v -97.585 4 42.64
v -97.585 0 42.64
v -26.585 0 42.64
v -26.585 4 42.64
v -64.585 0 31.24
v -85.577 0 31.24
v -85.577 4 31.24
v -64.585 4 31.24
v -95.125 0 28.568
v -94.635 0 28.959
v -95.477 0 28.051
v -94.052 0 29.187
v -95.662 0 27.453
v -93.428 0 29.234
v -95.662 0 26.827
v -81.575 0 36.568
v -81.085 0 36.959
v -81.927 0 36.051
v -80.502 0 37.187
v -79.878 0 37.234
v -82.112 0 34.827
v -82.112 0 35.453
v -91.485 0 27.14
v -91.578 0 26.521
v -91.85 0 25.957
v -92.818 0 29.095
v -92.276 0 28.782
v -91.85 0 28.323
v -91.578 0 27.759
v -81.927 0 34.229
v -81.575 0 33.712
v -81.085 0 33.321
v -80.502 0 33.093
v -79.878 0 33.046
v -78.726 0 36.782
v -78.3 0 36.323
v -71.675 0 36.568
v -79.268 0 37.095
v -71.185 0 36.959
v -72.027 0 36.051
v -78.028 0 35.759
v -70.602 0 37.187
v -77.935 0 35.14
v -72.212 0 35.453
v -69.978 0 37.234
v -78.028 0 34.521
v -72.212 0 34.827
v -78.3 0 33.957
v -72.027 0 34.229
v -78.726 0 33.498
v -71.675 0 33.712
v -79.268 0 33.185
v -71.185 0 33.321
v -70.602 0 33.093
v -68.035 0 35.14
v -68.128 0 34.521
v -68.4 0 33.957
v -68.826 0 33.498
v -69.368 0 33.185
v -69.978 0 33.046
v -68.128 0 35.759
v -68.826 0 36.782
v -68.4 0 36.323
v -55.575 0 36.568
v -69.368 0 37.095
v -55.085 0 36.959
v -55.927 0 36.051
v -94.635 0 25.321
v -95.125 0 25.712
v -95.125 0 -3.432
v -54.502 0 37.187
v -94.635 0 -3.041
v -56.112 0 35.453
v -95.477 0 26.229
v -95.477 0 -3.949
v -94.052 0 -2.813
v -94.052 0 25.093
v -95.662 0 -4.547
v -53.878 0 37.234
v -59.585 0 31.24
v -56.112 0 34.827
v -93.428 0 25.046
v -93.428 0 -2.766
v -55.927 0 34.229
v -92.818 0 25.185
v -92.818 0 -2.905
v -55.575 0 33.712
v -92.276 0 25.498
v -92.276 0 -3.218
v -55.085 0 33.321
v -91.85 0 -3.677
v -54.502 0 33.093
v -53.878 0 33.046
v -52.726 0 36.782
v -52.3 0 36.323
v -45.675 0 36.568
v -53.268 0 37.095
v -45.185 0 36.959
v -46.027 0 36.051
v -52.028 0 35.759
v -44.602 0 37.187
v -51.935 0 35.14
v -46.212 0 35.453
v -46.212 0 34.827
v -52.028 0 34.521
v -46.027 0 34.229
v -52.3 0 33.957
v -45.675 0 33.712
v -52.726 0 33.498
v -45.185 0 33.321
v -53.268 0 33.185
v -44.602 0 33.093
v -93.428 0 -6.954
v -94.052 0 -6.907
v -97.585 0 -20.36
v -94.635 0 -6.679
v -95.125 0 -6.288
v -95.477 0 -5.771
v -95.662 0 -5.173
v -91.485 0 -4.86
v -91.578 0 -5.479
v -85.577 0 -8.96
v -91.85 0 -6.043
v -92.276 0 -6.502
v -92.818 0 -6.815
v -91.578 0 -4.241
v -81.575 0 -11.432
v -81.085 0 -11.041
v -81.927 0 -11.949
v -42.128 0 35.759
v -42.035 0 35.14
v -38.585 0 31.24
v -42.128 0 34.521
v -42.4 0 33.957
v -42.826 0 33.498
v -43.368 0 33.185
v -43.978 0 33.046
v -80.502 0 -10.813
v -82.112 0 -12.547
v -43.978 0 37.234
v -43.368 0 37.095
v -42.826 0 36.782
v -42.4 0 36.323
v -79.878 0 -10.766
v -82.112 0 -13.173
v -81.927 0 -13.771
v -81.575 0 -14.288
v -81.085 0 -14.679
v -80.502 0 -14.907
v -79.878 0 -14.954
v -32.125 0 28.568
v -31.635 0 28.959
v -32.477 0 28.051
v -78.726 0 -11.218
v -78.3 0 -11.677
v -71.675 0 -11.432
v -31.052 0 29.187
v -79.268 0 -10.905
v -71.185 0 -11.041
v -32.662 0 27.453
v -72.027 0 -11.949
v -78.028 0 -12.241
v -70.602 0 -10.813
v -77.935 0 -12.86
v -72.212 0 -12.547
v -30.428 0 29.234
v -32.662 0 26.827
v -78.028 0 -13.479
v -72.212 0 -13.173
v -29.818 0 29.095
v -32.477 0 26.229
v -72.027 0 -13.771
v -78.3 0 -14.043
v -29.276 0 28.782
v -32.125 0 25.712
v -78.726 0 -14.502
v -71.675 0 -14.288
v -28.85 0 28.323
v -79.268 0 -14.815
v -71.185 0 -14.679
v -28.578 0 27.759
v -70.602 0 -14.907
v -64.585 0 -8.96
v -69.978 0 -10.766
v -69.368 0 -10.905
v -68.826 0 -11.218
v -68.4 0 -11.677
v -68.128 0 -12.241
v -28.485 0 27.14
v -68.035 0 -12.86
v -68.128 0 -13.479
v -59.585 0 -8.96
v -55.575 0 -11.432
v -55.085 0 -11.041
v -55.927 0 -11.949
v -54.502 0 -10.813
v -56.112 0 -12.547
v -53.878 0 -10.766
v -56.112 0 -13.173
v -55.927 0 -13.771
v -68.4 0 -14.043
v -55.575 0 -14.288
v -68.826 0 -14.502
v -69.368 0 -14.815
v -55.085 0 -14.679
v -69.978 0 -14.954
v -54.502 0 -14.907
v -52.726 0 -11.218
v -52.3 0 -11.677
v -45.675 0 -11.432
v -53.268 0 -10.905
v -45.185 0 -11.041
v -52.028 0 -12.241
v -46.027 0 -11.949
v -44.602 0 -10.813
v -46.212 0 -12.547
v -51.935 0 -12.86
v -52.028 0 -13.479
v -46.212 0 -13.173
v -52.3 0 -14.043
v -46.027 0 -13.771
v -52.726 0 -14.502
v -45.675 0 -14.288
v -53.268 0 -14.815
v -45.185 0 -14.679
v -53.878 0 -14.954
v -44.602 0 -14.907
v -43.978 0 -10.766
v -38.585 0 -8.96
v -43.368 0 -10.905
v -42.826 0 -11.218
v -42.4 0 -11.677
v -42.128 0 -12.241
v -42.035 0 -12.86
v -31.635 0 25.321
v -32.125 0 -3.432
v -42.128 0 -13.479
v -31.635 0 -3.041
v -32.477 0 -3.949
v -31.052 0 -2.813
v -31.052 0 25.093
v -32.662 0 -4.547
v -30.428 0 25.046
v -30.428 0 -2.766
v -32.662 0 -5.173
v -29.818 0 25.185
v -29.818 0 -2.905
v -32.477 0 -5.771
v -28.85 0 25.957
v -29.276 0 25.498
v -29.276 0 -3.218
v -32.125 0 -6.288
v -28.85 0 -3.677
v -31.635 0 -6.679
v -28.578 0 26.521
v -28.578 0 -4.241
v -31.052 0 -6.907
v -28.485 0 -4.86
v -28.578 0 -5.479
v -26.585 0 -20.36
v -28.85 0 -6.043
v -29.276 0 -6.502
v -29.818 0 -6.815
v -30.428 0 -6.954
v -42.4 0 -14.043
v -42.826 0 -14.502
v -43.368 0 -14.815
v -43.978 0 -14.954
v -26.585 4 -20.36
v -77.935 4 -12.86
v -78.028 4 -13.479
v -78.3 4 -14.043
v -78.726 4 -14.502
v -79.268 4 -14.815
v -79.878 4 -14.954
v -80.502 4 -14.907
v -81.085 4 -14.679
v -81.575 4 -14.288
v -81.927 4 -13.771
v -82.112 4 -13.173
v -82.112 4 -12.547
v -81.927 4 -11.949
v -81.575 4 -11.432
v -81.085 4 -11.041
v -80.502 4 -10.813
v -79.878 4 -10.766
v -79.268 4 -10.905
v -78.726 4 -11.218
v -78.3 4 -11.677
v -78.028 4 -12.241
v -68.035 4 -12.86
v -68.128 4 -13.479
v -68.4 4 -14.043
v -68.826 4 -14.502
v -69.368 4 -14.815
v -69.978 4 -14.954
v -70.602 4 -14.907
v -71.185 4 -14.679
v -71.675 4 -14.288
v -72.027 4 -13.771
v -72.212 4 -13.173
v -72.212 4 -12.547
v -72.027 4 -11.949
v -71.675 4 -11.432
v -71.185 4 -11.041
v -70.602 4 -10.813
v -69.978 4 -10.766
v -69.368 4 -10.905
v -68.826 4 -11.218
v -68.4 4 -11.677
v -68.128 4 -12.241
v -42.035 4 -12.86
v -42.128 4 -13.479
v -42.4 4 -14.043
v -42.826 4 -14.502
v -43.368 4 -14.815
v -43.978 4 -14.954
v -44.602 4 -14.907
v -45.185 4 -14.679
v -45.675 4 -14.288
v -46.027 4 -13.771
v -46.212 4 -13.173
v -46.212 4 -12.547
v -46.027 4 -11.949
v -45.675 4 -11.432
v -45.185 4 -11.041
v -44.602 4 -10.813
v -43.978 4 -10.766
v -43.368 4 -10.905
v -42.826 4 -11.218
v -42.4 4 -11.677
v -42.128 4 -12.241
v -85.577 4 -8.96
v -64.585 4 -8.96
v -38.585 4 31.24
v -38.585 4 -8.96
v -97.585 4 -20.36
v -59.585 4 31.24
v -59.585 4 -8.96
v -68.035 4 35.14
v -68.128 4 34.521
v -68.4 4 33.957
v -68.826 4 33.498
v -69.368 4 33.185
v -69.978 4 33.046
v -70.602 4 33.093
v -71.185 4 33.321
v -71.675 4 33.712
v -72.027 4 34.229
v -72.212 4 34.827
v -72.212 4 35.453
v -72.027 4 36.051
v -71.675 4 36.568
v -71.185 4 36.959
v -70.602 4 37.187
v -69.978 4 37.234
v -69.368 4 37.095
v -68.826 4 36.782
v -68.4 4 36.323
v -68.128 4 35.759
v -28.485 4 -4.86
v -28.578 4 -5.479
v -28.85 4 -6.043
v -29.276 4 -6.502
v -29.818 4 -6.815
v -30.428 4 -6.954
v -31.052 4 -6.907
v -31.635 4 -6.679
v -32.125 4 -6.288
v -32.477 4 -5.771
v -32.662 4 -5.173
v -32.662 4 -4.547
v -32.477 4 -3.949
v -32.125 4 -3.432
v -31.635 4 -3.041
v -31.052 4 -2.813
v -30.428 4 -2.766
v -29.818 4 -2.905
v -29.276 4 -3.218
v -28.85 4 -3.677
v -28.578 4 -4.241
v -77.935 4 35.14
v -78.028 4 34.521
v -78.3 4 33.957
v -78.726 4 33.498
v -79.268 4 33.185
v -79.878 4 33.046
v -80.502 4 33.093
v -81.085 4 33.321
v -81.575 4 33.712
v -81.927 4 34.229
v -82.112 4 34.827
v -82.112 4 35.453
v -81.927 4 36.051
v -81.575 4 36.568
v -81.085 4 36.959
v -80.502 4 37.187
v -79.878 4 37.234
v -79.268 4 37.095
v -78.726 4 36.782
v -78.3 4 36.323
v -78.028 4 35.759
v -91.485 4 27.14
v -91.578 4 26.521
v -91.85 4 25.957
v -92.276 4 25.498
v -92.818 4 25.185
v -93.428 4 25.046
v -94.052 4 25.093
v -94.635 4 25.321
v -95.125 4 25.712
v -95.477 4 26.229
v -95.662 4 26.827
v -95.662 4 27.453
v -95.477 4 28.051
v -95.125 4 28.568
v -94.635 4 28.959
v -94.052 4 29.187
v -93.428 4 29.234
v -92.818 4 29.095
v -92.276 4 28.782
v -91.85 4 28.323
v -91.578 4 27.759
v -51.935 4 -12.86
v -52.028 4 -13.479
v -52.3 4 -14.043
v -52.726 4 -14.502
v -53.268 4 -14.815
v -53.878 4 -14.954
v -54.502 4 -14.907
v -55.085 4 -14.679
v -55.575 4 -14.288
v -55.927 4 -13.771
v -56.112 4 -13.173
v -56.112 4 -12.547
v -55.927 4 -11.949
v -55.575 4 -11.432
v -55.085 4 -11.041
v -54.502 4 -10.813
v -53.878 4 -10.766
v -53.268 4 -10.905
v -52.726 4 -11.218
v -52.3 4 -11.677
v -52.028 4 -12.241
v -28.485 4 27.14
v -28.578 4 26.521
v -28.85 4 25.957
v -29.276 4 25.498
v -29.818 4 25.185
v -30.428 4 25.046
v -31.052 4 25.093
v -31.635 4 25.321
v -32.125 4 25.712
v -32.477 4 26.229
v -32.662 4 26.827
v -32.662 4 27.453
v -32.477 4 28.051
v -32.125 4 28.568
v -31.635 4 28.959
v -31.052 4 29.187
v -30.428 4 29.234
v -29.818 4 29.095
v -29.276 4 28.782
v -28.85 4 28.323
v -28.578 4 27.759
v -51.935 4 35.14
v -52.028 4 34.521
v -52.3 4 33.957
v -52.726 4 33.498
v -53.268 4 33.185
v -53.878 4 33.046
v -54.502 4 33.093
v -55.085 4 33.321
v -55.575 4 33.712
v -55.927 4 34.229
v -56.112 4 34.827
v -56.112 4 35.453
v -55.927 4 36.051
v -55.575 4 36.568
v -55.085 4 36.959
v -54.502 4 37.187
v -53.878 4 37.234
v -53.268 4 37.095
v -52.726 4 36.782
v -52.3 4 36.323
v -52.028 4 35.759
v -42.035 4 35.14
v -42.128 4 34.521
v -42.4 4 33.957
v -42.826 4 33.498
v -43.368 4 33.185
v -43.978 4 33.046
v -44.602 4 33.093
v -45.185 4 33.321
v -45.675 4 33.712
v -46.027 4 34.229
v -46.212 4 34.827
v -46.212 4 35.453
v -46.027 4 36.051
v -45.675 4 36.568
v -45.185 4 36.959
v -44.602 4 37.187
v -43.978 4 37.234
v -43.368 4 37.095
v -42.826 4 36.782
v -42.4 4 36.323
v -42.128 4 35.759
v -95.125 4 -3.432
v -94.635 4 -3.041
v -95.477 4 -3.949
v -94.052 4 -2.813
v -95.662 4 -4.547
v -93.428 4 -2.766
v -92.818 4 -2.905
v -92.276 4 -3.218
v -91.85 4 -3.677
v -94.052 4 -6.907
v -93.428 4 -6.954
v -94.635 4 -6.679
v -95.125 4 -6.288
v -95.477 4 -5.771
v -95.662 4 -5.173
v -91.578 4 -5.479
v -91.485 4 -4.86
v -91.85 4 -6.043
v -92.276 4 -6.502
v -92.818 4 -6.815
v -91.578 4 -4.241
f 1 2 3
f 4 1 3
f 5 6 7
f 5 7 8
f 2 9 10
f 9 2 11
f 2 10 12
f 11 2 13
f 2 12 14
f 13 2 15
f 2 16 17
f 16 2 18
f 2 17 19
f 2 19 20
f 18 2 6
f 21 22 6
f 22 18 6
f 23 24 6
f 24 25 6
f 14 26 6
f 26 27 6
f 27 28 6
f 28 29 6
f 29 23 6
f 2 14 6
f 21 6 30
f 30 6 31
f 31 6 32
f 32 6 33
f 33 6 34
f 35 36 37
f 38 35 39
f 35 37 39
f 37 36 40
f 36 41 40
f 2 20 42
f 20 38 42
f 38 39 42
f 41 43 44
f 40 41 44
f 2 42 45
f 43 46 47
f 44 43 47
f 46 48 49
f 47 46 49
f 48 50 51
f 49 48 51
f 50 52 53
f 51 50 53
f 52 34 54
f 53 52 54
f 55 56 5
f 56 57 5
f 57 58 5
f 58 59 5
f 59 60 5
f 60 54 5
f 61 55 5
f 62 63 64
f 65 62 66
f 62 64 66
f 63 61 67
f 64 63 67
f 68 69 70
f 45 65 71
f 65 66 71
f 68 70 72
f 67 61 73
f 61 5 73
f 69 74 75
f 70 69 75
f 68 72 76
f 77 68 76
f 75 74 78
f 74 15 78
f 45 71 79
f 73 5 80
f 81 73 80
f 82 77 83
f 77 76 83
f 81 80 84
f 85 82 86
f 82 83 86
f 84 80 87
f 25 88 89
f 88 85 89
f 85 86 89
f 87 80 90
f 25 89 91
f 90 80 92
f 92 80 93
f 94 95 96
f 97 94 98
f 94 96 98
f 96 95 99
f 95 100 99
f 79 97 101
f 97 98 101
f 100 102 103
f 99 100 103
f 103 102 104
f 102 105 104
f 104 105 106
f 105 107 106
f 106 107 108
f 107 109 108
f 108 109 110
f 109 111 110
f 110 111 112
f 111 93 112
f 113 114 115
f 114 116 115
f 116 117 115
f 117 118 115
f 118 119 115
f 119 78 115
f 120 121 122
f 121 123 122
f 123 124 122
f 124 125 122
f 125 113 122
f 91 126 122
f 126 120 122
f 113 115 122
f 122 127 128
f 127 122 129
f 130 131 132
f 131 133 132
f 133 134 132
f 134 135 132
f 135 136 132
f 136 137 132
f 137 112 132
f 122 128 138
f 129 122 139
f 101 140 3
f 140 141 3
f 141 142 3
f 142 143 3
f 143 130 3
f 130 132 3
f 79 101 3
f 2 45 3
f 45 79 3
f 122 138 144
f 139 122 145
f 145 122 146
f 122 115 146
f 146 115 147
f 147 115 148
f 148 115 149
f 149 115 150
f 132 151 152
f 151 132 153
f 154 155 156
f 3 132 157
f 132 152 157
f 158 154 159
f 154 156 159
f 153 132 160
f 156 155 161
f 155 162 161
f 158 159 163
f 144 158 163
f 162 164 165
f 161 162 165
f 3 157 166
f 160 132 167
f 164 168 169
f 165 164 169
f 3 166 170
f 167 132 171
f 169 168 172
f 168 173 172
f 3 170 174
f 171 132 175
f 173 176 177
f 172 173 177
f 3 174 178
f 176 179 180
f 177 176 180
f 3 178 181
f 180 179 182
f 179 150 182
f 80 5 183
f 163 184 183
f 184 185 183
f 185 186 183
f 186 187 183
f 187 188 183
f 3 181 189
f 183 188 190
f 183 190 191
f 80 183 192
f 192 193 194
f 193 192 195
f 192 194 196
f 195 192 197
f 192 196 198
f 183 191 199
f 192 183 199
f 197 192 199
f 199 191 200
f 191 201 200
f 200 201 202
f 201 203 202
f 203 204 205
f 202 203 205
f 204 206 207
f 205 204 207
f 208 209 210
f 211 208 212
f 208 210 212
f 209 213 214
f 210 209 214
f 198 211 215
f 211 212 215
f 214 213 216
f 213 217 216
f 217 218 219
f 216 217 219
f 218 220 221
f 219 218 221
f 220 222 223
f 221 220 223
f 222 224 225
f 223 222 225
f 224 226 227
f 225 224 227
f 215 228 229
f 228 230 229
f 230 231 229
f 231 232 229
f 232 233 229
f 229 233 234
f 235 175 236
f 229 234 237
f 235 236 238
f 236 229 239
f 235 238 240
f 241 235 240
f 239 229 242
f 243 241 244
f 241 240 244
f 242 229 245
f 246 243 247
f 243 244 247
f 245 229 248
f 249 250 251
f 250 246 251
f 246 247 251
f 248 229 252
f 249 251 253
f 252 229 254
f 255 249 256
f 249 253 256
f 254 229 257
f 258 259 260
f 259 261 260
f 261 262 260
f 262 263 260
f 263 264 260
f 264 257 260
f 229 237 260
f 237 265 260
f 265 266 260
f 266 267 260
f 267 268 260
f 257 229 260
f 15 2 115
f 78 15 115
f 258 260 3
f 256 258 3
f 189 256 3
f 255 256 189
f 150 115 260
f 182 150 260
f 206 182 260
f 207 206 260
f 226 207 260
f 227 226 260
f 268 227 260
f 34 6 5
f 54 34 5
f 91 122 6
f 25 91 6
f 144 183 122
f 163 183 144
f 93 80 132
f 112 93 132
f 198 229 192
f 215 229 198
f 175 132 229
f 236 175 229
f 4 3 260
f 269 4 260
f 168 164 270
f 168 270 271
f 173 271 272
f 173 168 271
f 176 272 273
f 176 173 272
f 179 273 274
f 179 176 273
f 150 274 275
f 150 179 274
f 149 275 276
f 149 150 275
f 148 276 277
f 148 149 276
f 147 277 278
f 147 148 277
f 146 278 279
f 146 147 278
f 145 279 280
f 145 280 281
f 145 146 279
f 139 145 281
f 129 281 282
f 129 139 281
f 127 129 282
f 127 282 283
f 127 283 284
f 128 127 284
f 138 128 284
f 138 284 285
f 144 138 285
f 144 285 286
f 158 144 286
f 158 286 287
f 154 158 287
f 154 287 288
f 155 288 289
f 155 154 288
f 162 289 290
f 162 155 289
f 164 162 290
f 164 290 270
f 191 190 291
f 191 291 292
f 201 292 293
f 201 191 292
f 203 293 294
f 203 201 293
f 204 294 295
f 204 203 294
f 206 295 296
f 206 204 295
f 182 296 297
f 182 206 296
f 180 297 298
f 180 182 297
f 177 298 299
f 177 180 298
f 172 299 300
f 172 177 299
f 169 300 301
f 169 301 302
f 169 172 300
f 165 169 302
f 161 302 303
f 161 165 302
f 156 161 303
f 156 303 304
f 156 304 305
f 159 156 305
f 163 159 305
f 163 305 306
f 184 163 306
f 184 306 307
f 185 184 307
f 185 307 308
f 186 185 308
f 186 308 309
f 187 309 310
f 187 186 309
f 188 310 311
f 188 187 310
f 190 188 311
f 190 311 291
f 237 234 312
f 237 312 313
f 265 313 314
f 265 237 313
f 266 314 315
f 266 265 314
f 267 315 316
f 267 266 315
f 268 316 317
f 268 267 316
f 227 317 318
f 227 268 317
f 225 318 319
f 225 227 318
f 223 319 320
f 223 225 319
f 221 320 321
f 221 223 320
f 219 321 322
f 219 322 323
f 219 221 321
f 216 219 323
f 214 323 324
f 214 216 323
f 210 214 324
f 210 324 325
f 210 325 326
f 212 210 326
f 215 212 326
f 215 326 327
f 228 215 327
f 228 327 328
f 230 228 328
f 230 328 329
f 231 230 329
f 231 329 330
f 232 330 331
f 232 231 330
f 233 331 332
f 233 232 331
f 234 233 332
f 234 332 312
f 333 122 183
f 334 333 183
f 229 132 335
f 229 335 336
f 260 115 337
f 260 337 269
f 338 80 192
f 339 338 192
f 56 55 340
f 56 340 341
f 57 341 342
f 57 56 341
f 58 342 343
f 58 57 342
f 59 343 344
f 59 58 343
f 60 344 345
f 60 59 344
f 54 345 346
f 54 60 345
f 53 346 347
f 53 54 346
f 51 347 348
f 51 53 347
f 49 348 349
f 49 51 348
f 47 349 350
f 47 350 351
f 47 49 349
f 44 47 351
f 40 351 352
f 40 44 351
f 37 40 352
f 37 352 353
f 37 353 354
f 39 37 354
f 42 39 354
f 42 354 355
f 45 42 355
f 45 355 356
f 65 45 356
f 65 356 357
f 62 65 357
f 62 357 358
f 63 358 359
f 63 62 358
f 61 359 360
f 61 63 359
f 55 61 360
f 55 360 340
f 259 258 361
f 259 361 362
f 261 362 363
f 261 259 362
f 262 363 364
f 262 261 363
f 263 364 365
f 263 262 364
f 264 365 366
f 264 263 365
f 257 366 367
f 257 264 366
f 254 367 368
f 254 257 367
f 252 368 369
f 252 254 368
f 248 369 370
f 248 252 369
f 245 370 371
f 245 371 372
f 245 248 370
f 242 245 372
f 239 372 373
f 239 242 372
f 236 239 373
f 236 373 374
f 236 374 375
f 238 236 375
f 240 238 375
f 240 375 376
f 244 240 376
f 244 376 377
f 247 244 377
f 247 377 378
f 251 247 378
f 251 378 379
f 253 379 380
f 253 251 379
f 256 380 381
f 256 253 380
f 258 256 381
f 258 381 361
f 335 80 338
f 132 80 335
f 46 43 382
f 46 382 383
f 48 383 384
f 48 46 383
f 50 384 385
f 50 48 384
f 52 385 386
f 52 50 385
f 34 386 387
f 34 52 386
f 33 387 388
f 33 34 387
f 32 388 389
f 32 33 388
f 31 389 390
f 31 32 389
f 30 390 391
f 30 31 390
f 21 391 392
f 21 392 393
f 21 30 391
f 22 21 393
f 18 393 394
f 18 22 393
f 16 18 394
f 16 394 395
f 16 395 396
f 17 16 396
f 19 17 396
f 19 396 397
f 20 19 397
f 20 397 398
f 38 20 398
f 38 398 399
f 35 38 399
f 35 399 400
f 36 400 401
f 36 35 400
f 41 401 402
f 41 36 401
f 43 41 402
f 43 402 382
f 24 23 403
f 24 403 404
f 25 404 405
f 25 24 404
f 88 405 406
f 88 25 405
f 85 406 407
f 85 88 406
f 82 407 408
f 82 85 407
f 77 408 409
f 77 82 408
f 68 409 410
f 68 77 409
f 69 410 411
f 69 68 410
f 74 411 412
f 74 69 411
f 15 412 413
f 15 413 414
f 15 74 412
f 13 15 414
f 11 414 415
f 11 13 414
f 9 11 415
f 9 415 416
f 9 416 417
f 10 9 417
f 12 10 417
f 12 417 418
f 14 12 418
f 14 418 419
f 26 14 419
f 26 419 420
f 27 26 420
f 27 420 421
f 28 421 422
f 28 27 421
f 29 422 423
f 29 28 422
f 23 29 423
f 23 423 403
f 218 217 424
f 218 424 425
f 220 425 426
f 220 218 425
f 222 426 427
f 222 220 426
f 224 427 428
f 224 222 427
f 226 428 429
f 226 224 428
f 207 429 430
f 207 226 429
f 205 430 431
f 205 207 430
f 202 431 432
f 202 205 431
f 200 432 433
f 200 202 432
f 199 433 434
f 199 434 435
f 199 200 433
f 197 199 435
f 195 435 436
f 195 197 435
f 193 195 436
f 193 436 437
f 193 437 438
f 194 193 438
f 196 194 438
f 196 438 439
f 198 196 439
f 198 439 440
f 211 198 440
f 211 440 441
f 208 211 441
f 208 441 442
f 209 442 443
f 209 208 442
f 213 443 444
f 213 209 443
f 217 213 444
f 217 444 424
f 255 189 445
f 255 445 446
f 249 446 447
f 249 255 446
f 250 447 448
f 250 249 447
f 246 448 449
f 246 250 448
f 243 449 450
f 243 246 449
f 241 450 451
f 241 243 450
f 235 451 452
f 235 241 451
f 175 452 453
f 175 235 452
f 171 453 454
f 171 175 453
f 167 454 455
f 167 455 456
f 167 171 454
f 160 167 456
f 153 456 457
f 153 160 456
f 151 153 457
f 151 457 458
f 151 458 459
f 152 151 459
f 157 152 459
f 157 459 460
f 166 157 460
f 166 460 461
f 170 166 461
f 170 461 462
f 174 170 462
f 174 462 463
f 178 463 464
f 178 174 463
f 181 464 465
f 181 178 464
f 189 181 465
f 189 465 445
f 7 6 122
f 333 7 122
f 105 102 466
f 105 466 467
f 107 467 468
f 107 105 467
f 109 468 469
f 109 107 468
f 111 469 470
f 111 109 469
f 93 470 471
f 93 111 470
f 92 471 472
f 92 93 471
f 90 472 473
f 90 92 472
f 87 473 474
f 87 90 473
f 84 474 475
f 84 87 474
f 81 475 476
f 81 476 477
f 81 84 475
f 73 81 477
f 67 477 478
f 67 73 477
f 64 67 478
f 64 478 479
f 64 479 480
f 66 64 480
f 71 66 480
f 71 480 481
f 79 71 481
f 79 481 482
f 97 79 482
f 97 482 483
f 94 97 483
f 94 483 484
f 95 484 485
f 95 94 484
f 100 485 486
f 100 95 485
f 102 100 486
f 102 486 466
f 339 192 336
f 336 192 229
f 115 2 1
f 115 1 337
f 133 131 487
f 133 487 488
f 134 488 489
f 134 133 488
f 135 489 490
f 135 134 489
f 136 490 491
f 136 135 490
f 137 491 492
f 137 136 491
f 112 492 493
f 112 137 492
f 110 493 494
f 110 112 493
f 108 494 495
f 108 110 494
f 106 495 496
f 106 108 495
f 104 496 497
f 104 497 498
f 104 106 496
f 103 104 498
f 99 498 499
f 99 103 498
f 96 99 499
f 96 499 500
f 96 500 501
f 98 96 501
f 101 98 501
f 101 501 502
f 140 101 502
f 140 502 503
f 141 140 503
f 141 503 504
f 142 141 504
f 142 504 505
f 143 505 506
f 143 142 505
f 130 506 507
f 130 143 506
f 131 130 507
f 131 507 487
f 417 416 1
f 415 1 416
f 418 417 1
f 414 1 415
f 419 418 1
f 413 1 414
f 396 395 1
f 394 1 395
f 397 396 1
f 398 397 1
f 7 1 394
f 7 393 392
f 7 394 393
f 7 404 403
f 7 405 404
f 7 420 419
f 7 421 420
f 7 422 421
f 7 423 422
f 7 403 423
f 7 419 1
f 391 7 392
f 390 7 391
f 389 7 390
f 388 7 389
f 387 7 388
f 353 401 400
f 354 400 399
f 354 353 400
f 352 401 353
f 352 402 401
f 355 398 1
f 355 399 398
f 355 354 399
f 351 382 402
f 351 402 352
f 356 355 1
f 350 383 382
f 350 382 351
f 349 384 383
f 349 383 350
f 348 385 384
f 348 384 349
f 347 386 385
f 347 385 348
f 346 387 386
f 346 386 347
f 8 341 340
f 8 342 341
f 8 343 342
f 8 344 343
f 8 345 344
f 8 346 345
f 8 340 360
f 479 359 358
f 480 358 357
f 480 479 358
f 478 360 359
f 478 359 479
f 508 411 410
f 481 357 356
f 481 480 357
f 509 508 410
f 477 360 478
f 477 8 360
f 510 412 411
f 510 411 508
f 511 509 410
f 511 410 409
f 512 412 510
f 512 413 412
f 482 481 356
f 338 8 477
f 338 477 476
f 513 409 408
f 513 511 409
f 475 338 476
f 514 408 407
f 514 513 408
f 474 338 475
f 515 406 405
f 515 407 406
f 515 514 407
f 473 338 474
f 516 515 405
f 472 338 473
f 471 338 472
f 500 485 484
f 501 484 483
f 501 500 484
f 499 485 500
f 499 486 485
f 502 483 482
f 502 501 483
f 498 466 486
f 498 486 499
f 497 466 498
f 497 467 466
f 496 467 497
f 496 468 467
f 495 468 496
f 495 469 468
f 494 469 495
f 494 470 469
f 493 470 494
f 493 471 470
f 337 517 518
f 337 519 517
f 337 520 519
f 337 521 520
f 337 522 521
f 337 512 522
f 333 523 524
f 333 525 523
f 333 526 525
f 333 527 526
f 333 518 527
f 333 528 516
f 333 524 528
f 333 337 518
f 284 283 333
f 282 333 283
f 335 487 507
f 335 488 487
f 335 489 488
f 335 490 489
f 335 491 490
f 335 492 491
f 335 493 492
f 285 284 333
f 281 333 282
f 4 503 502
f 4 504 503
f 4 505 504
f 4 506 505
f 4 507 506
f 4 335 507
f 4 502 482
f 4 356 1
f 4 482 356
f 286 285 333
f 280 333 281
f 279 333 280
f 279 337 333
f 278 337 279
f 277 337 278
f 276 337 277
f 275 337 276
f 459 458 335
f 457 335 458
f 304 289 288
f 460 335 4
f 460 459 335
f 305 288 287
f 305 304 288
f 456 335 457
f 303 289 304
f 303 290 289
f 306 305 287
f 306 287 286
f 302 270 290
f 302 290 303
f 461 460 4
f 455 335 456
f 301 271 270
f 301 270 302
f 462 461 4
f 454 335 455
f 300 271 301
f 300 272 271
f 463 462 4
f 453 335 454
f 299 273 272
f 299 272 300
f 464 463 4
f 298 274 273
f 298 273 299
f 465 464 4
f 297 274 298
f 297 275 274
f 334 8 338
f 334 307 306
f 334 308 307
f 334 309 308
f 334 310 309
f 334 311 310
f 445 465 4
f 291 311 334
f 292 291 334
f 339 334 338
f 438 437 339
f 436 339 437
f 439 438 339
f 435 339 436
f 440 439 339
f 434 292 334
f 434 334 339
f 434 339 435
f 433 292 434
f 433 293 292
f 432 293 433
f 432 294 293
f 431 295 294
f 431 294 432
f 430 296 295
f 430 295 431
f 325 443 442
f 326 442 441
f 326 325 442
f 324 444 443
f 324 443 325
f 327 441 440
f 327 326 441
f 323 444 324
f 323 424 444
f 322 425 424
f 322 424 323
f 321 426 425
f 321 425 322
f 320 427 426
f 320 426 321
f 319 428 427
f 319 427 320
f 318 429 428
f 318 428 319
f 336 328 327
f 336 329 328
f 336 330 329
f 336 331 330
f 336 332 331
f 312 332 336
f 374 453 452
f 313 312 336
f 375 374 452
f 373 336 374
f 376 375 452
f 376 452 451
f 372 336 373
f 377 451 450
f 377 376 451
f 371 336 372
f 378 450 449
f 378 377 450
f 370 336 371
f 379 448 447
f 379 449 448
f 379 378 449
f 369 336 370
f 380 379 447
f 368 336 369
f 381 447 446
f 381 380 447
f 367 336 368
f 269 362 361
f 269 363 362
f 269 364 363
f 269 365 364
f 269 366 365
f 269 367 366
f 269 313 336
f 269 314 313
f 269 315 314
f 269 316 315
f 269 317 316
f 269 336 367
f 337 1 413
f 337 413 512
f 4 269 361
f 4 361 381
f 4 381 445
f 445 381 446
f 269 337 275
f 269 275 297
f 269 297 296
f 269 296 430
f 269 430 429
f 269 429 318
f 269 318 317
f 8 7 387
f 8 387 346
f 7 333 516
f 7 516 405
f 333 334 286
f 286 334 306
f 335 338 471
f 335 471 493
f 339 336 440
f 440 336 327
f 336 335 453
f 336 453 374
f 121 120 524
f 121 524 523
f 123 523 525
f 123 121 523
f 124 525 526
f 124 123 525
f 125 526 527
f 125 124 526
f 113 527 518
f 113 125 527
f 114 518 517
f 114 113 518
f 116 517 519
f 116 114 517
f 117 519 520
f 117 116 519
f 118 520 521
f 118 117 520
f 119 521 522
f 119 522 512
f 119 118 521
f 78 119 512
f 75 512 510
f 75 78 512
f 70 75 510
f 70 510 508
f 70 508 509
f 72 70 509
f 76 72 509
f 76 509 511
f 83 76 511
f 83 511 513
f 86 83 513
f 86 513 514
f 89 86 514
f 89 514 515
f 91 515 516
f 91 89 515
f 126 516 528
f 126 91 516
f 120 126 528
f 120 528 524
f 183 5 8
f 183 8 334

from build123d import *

# Parameters (mm, degrees)
SKETCH1_W           = 71
SKETCH1_H           = 63
SKETCH1_R           = 2.1
SKETCH1_W_2         = 20.991665644
SKETCH1_H_2         = 40.2
SKETCH1_W_3         = 21
BOSS_EXTRUDE1_DEPTH = 4


with BuildPart() as part:
    # Sketch1 → Boss-Extrude1 (new body)
    with BuildSketch(Plane(origin=(0, 0, 0), x_dir=(1, 0, 0), z_dir=(0, 1, 0))):
        with Locations((-62.085116344, -11.139897002)):
            Rectangle(SKETCH1_W, SKETCH1_H)
        with Locations((-80.035116344, 12.860102998)):
            Circle(SKETCH1_R, mode=Mode.SUBTRACT)
        with Locations((-70.135116344, 12.860102998)):
            Circle(SKETCH1_R, mode=Mode.SUBTRACT)
        with Locations((-54.035116344, 12.860102998)):
            Circle(SKETCH1_R, mode=Mode.SUBTRACT)
        with Locations((-44.135116344, 12.860102998)):
            Circle(SKETCH1_R, mode=Mode.SUBTRACT)
        with Locations((-30.585116344, 4.860102998)):
            Circle(SKETCH1_R, mode=Mode.SUBTRACT)
        with Locations((-93.585116344, 4.860102998)):
            Circle(SKETCH1_R, mode=Mode.SUBTRACT)
        with Locations((-30.585116344, -27.139897002)):
            Circle(SKETCH1_R, mode=Mode.SUBTRACT)
        with Locations((-44.135116344, -35.139897002)):
            Circle(SKETCH1_R, mode=Mode.SUBTRACT)
        with Locations((-54.035116344, -35.139897002)):
            Circle(SKETCH1_R, mode=Mode.SUBTRACT)
        with Locations((-80.035116344, -35.139897002)):
            Circle(SKETCH1_R, mode=Mode.SUBTRACT)
        with Locations((-70.135116344, -35.139897002)):
            Circle(SKETCH1_R, mode=Mode.SUBTRACT)
        with Locations((-93.585116344, -27.139897002)):
            Circle(SKETCH1_R, mode=Mode.SUBTRACT)
        with Locations((-75.080949166, -11.139897002)):
            Rectangle(SKETCH1_W_2, SKETCH1_H_2, mode=Mode.SUBTRACT)
        with Locations((-49.085116344, -11.139897002)):
            Rectangle(SKETCH1_W_3, SKETCH1_H_2, mode=Mode.SUBTRACT)
    extrude(amount=BOSS_EXTRUDE1_DEPTH)


solid = part.part
